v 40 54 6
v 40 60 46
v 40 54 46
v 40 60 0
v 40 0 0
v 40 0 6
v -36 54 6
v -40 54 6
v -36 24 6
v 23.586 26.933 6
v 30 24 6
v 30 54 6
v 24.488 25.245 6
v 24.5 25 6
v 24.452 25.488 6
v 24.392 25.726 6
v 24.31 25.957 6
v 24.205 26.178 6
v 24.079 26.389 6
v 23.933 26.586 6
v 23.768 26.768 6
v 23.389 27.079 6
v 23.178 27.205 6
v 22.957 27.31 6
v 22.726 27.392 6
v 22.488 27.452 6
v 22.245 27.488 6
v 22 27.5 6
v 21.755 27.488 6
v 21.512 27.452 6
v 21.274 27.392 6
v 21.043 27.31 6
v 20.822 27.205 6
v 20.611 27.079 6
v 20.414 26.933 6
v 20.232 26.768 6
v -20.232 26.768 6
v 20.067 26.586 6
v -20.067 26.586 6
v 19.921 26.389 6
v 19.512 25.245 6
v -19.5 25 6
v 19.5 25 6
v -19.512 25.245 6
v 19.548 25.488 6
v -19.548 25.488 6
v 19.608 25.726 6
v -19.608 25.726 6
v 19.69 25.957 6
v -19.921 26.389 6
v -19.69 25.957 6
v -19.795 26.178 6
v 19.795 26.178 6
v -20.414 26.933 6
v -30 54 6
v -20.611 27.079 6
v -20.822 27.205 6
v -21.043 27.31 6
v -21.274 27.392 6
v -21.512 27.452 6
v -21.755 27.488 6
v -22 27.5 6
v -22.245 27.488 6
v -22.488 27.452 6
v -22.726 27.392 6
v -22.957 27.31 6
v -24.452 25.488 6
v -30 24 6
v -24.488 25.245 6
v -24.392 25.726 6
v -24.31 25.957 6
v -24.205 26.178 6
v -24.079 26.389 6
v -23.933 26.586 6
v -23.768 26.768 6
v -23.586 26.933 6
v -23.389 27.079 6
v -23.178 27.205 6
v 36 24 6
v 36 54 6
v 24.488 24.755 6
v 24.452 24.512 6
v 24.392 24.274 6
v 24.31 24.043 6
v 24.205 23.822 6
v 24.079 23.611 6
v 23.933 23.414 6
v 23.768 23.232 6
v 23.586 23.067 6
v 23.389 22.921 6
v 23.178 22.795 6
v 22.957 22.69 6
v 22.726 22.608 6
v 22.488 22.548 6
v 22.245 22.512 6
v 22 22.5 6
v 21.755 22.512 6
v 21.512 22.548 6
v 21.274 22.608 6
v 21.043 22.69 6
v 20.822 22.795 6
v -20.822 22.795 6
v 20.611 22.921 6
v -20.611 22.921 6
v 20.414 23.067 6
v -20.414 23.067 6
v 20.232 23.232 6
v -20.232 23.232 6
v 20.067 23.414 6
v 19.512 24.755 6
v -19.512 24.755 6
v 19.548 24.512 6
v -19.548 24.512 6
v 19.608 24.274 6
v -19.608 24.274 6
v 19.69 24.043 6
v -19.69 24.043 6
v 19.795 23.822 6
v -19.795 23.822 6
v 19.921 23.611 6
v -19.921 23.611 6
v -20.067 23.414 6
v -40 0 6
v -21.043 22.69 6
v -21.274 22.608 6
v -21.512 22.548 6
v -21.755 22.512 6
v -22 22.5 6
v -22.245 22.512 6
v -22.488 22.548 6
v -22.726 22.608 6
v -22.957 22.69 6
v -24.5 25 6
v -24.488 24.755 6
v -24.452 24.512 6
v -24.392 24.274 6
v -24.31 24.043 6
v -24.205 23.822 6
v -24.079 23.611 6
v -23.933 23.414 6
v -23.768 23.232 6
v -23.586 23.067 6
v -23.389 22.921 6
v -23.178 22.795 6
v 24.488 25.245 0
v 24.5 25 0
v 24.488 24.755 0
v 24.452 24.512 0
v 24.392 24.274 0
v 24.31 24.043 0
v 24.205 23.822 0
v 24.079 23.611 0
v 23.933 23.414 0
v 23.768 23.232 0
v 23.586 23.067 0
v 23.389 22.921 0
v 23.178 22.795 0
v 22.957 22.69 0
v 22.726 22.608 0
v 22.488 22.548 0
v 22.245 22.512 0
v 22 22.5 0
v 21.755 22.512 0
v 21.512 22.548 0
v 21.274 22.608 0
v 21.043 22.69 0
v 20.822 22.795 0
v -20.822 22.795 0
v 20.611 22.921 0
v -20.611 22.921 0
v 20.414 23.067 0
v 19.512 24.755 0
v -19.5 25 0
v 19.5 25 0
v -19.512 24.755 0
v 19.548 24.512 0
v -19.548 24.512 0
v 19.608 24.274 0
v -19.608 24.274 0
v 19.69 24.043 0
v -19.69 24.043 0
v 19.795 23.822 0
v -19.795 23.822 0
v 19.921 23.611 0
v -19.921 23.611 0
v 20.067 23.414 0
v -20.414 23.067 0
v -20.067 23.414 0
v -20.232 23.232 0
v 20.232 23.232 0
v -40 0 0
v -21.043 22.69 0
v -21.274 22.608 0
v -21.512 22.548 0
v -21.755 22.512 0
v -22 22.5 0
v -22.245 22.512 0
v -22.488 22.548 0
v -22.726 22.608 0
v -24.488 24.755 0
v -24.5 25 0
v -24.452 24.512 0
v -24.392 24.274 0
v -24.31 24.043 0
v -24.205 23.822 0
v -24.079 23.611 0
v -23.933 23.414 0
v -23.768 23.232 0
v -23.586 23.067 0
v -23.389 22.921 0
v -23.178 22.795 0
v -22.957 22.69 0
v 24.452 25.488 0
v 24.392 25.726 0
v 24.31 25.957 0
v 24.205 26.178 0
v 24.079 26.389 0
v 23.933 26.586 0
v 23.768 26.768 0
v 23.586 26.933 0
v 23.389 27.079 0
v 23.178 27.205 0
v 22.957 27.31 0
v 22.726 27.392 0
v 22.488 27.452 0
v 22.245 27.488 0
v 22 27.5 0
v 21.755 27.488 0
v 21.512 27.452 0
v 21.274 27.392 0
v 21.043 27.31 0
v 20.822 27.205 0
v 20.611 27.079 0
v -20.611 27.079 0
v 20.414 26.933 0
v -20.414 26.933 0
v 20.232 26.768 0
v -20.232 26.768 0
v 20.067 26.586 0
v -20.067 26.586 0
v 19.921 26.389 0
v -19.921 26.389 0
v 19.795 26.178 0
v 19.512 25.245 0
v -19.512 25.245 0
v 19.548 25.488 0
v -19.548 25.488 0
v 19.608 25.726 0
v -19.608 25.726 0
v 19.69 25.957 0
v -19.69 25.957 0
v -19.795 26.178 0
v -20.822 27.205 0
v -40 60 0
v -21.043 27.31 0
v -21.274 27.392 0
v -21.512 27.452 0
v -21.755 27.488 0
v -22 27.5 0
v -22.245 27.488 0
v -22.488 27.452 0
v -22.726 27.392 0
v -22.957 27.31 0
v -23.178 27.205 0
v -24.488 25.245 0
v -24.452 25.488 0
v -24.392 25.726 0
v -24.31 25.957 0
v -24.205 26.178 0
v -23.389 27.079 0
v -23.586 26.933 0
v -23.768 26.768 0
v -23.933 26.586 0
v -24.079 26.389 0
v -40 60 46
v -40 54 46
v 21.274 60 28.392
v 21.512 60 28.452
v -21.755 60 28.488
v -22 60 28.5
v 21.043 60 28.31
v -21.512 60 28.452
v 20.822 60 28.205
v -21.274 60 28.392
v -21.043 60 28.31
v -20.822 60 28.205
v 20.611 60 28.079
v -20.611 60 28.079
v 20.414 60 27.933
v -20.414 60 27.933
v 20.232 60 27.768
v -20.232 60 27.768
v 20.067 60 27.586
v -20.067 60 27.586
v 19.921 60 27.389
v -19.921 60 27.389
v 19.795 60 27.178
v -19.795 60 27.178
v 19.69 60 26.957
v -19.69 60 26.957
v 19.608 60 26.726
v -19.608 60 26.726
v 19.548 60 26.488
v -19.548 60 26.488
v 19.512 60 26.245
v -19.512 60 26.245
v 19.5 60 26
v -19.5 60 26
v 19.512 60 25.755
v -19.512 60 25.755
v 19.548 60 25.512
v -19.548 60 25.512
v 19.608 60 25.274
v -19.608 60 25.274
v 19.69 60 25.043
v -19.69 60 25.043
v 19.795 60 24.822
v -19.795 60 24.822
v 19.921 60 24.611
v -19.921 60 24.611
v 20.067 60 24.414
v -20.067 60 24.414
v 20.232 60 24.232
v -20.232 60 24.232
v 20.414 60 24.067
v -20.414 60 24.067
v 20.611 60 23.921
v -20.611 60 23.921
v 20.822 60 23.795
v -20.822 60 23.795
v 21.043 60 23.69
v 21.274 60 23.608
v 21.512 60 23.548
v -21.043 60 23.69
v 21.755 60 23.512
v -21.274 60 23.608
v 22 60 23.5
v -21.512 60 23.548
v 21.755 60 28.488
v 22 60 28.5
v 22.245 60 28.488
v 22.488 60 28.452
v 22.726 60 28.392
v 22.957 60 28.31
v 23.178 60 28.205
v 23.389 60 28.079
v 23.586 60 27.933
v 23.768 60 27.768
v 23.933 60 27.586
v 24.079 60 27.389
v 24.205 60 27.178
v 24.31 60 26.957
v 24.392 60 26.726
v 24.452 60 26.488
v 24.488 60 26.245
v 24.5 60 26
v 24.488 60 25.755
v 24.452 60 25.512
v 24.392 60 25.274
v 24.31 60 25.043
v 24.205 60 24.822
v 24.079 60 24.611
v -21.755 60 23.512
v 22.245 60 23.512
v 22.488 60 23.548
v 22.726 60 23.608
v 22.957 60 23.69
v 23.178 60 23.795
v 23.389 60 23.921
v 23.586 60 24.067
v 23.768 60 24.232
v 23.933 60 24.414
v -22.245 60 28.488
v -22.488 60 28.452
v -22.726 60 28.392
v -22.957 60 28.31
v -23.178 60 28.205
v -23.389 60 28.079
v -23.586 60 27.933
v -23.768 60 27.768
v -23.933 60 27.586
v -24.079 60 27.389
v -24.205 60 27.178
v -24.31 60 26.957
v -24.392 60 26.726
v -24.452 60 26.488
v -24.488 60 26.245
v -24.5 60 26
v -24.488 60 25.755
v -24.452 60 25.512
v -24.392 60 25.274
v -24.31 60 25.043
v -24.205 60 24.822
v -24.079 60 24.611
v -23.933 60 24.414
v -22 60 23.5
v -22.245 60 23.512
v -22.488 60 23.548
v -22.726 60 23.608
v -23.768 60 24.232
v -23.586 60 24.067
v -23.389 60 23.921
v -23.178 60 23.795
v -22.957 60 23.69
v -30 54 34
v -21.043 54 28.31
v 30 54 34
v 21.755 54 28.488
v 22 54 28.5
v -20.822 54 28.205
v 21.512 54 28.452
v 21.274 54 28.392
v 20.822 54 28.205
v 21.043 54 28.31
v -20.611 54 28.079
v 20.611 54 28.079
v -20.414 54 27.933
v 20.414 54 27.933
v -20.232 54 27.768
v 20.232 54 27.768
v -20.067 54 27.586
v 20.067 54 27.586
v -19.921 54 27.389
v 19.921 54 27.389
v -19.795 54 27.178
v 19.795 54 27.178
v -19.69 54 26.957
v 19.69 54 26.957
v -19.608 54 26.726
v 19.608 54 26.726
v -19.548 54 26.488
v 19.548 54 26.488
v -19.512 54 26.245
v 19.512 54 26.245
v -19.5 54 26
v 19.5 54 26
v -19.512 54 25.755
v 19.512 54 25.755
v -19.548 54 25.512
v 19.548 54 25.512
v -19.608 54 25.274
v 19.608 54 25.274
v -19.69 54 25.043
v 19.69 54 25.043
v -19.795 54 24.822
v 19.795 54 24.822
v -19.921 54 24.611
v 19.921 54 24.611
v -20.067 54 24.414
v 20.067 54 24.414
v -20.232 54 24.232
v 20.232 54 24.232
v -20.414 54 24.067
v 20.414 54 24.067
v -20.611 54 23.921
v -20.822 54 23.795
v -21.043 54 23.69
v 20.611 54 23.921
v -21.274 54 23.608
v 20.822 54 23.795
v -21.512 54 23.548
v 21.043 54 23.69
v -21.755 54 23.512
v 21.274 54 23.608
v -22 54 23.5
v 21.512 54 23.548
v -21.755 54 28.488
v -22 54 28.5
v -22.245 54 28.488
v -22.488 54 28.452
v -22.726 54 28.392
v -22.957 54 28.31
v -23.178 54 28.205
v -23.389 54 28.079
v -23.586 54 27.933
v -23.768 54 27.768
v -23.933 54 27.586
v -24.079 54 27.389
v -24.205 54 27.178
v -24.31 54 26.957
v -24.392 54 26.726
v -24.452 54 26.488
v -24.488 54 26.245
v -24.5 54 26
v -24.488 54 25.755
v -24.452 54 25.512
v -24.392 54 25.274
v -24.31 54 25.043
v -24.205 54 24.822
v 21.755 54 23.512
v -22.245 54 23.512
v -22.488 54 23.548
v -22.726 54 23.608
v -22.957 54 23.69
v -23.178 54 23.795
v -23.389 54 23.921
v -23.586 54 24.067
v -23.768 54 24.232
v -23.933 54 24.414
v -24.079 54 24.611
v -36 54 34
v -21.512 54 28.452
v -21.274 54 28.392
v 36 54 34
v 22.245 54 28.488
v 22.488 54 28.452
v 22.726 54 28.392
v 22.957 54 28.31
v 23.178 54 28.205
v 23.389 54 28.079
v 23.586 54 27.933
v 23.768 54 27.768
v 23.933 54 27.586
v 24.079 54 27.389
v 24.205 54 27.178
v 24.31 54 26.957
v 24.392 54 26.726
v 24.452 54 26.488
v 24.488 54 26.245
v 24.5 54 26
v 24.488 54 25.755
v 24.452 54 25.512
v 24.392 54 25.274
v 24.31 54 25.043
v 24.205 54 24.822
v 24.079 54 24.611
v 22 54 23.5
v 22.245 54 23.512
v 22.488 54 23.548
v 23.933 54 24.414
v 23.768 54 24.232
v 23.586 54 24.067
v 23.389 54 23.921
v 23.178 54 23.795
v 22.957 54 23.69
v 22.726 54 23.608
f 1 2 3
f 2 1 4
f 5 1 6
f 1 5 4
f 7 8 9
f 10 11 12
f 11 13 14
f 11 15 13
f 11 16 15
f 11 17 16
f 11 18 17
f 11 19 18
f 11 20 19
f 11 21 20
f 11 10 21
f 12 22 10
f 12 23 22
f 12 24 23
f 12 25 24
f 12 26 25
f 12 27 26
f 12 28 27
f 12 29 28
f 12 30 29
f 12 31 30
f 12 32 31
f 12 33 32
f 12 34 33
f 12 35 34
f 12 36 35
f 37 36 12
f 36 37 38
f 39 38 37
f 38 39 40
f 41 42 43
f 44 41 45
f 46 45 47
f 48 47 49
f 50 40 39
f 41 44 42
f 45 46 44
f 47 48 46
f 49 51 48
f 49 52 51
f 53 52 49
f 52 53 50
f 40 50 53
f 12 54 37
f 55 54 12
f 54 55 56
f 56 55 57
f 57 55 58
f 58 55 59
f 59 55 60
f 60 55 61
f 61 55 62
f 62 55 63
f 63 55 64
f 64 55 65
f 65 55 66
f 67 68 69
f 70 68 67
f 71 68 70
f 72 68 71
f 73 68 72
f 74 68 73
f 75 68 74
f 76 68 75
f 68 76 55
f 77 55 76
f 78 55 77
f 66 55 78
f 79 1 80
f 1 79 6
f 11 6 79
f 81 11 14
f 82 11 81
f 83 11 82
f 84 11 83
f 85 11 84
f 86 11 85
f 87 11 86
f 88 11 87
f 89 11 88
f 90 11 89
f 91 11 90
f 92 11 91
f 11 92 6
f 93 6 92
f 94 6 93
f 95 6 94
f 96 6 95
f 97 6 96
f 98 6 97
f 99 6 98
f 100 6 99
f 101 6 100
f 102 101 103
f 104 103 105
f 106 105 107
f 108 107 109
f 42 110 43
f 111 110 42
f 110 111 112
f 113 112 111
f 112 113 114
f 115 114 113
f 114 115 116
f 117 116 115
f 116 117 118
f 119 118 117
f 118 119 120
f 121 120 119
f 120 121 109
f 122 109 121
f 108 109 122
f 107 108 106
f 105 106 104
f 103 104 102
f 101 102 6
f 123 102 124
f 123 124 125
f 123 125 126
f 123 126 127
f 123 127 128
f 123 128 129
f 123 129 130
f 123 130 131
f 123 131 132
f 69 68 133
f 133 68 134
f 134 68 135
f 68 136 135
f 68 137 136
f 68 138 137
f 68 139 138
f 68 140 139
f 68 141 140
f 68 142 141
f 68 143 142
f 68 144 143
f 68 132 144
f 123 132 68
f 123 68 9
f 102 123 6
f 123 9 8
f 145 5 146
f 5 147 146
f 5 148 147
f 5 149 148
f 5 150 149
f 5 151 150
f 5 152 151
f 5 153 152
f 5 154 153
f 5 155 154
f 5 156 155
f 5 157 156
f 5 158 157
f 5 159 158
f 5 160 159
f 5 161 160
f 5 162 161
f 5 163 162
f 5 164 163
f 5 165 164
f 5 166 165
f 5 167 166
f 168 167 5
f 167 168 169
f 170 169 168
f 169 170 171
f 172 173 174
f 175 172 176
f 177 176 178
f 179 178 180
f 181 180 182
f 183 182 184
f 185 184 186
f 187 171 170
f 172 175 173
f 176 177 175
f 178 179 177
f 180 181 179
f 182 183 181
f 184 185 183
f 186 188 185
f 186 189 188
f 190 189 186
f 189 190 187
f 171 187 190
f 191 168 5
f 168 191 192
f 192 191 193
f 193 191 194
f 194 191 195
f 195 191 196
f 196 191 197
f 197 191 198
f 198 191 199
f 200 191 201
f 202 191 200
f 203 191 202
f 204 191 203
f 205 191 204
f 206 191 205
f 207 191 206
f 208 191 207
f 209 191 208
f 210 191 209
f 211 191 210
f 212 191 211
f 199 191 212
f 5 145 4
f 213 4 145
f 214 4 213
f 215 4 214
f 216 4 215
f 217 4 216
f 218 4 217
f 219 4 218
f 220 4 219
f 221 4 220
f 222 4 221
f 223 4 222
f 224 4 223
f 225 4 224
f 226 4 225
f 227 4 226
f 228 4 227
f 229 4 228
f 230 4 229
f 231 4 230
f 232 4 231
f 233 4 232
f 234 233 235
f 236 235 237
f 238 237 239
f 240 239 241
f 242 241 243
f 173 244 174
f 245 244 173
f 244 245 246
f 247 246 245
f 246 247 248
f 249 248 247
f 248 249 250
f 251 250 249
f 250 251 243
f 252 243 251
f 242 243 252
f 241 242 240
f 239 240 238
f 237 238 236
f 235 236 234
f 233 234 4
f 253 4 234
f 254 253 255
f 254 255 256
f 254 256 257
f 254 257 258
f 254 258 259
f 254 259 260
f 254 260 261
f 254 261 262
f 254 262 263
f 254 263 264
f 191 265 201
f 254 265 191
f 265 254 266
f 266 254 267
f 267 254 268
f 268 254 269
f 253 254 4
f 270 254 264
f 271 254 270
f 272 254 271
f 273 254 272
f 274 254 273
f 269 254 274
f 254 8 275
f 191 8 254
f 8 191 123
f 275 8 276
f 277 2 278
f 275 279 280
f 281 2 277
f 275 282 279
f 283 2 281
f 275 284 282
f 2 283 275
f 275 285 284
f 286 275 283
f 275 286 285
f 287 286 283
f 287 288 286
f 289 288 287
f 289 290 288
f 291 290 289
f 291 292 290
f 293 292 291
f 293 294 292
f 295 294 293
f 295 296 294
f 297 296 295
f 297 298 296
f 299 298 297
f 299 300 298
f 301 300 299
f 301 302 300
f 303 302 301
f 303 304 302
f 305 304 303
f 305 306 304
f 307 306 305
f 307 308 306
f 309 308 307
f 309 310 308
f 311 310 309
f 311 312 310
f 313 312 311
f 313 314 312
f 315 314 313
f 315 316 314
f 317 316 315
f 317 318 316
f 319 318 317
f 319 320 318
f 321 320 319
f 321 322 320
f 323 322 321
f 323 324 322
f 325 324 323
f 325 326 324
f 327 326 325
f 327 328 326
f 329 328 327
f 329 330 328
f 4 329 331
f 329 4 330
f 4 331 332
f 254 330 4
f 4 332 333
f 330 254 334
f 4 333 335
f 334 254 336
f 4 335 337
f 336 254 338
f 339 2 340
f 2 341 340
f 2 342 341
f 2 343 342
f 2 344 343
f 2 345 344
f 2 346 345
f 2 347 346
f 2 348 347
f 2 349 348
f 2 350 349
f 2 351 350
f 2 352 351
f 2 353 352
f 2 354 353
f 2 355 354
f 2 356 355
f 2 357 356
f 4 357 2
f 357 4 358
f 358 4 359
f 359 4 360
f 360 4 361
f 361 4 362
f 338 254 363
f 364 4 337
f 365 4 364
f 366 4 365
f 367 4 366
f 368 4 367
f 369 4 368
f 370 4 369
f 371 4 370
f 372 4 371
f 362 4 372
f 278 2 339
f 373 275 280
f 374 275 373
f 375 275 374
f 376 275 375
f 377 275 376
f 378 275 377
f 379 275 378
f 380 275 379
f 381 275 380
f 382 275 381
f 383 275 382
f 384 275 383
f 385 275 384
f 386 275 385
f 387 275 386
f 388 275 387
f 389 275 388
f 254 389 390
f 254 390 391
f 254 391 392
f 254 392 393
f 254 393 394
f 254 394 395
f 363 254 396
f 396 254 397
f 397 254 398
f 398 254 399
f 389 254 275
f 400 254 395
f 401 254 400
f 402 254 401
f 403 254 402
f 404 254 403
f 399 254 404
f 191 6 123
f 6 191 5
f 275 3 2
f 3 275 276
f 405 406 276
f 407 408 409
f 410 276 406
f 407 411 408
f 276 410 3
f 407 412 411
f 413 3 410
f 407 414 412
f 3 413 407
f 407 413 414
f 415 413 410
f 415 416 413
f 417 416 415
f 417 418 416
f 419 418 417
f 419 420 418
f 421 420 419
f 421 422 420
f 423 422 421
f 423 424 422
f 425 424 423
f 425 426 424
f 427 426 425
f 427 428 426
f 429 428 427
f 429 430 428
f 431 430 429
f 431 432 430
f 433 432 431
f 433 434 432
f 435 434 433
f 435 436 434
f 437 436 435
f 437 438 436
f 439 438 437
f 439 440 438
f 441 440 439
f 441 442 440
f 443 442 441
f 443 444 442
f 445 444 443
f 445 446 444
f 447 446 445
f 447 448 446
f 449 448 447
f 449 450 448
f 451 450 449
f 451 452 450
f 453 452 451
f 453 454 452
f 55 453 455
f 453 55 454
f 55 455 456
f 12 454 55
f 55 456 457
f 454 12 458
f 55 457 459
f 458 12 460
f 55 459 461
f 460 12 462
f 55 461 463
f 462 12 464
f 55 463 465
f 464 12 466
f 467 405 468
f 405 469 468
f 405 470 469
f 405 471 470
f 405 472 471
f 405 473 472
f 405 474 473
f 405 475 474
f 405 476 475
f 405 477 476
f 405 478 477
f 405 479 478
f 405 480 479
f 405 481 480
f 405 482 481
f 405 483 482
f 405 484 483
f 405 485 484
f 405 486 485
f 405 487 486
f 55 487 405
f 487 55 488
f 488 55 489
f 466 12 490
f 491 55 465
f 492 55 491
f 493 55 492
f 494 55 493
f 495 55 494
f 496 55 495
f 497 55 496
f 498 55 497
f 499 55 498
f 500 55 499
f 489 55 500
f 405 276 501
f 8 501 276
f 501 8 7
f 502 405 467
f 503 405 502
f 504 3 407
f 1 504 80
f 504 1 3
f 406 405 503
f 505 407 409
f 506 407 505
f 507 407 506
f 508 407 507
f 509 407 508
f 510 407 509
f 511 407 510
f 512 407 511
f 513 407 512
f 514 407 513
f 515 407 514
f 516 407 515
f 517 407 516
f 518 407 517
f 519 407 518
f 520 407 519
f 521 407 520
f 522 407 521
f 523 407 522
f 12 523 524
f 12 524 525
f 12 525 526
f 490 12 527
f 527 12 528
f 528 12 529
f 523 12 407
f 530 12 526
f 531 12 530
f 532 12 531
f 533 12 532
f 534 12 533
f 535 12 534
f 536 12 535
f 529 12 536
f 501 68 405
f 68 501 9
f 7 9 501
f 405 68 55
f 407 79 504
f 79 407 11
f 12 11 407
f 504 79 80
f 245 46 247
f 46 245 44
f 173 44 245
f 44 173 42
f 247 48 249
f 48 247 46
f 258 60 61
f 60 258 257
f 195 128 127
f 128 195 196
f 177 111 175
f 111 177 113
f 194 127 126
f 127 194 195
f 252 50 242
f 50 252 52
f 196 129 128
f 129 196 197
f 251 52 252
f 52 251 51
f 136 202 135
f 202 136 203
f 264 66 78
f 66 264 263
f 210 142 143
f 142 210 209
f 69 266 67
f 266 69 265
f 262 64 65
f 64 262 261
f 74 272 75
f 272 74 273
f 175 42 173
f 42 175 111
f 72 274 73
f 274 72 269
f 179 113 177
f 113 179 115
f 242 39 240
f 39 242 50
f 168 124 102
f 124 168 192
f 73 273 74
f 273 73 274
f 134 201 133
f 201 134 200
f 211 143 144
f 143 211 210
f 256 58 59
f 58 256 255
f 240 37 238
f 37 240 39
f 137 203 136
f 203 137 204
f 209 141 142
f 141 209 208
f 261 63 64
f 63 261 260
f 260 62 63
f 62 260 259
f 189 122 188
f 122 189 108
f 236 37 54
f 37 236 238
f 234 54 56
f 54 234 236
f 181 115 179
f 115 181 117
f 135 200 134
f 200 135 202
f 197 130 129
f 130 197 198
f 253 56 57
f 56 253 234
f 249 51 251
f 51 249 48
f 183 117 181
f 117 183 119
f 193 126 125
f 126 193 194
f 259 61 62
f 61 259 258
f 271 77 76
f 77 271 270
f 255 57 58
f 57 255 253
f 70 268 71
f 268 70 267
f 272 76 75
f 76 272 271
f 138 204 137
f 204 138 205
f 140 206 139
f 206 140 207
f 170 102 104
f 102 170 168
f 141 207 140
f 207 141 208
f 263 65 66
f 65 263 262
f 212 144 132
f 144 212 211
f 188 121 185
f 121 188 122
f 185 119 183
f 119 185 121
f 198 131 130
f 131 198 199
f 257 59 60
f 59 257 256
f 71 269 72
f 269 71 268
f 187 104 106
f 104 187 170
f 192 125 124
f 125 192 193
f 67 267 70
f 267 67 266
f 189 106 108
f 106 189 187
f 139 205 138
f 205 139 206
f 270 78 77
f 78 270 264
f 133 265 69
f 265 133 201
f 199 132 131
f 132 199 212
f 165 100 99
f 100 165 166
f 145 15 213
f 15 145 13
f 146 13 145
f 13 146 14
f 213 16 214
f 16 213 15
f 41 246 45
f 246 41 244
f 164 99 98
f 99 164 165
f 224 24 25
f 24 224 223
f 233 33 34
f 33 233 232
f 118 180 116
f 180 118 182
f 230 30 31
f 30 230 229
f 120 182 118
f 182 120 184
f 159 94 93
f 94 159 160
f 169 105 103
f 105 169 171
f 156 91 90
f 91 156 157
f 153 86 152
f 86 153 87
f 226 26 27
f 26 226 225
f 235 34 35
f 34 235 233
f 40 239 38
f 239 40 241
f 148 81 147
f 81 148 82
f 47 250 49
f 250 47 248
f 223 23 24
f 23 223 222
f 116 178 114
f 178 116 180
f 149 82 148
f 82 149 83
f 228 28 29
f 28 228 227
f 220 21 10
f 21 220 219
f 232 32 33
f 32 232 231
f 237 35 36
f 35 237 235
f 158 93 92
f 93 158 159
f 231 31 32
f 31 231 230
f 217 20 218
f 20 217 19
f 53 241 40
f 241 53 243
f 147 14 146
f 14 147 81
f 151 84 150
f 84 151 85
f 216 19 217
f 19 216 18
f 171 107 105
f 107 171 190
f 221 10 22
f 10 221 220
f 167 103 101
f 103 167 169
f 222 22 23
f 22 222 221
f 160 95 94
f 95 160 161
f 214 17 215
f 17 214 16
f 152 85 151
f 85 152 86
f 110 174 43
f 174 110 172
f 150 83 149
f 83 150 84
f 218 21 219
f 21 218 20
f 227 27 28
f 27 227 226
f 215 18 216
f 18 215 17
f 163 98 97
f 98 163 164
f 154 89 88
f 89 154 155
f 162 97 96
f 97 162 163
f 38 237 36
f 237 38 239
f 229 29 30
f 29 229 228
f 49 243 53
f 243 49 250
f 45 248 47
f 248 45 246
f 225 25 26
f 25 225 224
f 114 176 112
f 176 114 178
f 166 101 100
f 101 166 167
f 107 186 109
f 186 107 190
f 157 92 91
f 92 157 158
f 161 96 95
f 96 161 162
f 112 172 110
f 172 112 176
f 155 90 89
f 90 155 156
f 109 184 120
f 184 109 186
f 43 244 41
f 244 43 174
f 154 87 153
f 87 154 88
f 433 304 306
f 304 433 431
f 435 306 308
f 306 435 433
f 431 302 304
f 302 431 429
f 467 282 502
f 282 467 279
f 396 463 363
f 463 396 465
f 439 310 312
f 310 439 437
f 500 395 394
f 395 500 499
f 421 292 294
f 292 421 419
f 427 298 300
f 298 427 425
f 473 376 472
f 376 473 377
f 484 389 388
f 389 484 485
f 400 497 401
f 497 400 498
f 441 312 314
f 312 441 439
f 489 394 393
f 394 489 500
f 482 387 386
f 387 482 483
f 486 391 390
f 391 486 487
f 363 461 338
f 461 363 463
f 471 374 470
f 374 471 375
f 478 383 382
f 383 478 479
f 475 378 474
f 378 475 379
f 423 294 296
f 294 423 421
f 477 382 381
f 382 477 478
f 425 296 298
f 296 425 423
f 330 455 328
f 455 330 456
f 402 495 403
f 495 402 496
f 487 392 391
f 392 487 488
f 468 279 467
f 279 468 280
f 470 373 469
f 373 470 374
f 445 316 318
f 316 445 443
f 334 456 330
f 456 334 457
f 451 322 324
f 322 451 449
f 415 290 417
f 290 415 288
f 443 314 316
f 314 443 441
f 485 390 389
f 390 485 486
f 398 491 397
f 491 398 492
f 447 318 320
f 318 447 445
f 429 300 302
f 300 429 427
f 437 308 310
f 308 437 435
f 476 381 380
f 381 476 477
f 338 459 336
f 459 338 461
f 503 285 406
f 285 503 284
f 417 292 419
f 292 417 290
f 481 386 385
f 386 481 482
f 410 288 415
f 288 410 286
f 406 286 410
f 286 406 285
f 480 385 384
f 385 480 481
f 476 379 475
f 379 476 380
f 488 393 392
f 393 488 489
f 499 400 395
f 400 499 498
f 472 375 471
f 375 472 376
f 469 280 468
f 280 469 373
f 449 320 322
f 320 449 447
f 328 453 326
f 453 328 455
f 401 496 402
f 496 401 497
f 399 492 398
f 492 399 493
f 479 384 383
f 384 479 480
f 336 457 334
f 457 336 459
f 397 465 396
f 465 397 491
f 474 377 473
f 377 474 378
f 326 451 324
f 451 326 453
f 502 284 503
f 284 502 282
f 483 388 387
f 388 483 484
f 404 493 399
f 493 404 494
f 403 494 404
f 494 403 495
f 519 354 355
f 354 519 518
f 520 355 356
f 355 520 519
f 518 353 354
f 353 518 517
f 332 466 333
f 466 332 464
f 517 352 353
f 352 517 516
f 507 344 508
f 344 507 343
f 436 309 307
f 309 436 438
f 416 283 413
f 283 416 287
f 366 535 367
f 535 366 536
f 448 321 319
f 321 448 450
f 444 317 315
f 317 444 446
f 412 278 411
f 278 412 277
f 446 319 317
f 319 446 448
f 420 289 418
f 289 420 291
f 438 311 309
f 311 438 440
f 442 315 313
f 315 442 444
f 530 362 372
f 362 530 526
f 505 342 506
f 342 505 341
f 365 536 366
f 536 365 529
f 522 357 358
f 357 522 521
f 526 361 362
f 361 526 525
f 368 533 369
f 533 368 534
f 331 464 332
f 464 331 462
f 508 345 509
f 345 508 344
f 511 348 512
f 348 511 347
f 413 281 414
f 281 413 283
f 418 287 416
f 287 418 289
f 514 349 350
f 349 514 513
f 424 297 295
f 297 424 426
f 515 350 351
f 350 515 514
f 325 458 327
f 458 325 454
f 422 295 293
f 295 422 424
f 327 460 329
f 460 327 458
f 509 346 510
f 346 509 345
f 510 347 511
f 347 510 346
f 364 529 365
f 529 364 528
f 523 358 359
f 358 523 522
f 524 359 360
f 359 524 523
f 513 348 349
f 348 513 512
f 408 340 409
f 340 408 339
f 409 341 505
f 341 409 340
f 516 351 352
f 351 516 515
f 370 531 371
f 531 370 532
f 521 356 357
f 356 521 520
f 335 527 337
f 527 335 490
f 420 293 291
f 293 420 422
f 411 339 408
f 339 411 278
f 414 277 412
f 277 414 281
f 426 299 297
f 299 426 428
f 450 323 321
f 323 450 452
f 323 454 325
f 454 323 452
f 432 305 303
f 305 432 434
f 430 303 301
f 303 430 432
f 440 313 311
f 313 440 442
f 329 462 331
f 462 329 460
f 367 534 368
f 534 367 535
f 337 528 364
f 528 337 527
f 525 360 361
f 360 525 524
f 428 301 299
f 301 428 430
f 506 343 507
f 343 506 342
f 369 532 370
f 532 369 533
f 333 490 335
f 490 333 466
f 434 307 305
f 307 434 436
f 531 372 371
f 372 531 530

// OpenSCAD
// OpenSCAD L-Bracket with Gussets and Mounting Holes
// Base Plate: 80 x 60 x 6 mm
// Rear Vertical Plate: 80 x 40 x 6 mm

$fn = 64;

// Base Plate Dimensions
base_x = 80;
base_y = 60;
base_z = 6;

// Rear Vertical Plate Dimensions
back_x = 80;
back_y = 6;
back_z = 40;

// Mounting Hole Diameter
hole_d = 5;

// Base Plate Hole Positions
base_hole_x_offset = 22;
base_hole_y_pos = 25;

// Back Plate Hole Positions
back_hole_x_offset = 22;
back_hole_z_pos = 26; // Height above origin (middle of vertical plate)

// Gusset Stiffener Dimensions
gusset_thick = 6;
gusset_len_y = 30; // Length along base plate from back wall
gusset_len_z = 28; // Height along back wall from base plate top
gusset_x_pos = 33; // Offset from center along X axis

module gusset() {
    y0 = base_y - back_y - gusset_len_y;
    y1 = base_y - back_y;
    z0 = base_z;
    z1 = base_z + gusset_len_z;
    t  = gusset_thick;
    
    // Polyhedron forming a right-triangular prism
    points = [
        [0, y0, z0], // 0: Front bottom left
        [t, y0, z0], // 1: Front bottom right
        [0, y1, z0], // 2: Rear bottom left
        [t, y1, z0], // 3: Rear bottom right
        [0, y1, z1], // 4: Rear top left
        [t, y1, z1]  // 5: Rear top right
    ];
    
    faces = [
        [0, 2, 3], [0, 3, 1], // Bottom face
        [0, 1, 5], [0, 5, 4], // Sloped face
        [2, 4, 5], [2, 5, 3], // Rear face
        [0, 4, 2],           // Left face
        [1, 3, 5]            // Right face
    ];
    
    polyhedron(points = points, faces = faces);
}

module l_bracket() {
    difference() {
        union() {
            // Base Plate
            translate([-base_x / 2, 0, 0])
                cube([base_x, base_y, base_z]);
            
            // Rear Vertical Plate
            translate([-back_x / 2, base_y - back_y, base_z])
                cube([back_x, back_y, back_z]);
            
            // Left Gusset
            translate([-gusset_x_pos - gusset_thick / 2, 0, 0])
                gusset();
                
            // Right Gusset
            translate([gusset_x_pos - gusset_thick / 2, 0, 0])
                gusset();
        }
        
        // Vertical Mounting Holes in Base
        translate([-base_hole_x_offset, base_hole_y_pos, -1])
            cylinder(d = hole_d, h = base_z + 2);
            
        translate([base_hole_x_offset, base_hole_y_pos, -1])
            cylinder(d = hole_d, h = base_z + 2);
            
        // Horizontal Mounting Holes in Rear Plate
        translate([-back_hole_x_offset, base_y + 1, back_hole_z_pos])
            rotate([90, 0, 0])
                cylinder(d = hole_d, h = back_y + 2);
                
        translate([back_hole_x_offset, base_y + 1, back_hole_z_pos])
            rotate([90, 0, 0])
                cylinder(d = hole_d, h = back_y + 2);
    }
}

// Render Assembly
l_bracket();
